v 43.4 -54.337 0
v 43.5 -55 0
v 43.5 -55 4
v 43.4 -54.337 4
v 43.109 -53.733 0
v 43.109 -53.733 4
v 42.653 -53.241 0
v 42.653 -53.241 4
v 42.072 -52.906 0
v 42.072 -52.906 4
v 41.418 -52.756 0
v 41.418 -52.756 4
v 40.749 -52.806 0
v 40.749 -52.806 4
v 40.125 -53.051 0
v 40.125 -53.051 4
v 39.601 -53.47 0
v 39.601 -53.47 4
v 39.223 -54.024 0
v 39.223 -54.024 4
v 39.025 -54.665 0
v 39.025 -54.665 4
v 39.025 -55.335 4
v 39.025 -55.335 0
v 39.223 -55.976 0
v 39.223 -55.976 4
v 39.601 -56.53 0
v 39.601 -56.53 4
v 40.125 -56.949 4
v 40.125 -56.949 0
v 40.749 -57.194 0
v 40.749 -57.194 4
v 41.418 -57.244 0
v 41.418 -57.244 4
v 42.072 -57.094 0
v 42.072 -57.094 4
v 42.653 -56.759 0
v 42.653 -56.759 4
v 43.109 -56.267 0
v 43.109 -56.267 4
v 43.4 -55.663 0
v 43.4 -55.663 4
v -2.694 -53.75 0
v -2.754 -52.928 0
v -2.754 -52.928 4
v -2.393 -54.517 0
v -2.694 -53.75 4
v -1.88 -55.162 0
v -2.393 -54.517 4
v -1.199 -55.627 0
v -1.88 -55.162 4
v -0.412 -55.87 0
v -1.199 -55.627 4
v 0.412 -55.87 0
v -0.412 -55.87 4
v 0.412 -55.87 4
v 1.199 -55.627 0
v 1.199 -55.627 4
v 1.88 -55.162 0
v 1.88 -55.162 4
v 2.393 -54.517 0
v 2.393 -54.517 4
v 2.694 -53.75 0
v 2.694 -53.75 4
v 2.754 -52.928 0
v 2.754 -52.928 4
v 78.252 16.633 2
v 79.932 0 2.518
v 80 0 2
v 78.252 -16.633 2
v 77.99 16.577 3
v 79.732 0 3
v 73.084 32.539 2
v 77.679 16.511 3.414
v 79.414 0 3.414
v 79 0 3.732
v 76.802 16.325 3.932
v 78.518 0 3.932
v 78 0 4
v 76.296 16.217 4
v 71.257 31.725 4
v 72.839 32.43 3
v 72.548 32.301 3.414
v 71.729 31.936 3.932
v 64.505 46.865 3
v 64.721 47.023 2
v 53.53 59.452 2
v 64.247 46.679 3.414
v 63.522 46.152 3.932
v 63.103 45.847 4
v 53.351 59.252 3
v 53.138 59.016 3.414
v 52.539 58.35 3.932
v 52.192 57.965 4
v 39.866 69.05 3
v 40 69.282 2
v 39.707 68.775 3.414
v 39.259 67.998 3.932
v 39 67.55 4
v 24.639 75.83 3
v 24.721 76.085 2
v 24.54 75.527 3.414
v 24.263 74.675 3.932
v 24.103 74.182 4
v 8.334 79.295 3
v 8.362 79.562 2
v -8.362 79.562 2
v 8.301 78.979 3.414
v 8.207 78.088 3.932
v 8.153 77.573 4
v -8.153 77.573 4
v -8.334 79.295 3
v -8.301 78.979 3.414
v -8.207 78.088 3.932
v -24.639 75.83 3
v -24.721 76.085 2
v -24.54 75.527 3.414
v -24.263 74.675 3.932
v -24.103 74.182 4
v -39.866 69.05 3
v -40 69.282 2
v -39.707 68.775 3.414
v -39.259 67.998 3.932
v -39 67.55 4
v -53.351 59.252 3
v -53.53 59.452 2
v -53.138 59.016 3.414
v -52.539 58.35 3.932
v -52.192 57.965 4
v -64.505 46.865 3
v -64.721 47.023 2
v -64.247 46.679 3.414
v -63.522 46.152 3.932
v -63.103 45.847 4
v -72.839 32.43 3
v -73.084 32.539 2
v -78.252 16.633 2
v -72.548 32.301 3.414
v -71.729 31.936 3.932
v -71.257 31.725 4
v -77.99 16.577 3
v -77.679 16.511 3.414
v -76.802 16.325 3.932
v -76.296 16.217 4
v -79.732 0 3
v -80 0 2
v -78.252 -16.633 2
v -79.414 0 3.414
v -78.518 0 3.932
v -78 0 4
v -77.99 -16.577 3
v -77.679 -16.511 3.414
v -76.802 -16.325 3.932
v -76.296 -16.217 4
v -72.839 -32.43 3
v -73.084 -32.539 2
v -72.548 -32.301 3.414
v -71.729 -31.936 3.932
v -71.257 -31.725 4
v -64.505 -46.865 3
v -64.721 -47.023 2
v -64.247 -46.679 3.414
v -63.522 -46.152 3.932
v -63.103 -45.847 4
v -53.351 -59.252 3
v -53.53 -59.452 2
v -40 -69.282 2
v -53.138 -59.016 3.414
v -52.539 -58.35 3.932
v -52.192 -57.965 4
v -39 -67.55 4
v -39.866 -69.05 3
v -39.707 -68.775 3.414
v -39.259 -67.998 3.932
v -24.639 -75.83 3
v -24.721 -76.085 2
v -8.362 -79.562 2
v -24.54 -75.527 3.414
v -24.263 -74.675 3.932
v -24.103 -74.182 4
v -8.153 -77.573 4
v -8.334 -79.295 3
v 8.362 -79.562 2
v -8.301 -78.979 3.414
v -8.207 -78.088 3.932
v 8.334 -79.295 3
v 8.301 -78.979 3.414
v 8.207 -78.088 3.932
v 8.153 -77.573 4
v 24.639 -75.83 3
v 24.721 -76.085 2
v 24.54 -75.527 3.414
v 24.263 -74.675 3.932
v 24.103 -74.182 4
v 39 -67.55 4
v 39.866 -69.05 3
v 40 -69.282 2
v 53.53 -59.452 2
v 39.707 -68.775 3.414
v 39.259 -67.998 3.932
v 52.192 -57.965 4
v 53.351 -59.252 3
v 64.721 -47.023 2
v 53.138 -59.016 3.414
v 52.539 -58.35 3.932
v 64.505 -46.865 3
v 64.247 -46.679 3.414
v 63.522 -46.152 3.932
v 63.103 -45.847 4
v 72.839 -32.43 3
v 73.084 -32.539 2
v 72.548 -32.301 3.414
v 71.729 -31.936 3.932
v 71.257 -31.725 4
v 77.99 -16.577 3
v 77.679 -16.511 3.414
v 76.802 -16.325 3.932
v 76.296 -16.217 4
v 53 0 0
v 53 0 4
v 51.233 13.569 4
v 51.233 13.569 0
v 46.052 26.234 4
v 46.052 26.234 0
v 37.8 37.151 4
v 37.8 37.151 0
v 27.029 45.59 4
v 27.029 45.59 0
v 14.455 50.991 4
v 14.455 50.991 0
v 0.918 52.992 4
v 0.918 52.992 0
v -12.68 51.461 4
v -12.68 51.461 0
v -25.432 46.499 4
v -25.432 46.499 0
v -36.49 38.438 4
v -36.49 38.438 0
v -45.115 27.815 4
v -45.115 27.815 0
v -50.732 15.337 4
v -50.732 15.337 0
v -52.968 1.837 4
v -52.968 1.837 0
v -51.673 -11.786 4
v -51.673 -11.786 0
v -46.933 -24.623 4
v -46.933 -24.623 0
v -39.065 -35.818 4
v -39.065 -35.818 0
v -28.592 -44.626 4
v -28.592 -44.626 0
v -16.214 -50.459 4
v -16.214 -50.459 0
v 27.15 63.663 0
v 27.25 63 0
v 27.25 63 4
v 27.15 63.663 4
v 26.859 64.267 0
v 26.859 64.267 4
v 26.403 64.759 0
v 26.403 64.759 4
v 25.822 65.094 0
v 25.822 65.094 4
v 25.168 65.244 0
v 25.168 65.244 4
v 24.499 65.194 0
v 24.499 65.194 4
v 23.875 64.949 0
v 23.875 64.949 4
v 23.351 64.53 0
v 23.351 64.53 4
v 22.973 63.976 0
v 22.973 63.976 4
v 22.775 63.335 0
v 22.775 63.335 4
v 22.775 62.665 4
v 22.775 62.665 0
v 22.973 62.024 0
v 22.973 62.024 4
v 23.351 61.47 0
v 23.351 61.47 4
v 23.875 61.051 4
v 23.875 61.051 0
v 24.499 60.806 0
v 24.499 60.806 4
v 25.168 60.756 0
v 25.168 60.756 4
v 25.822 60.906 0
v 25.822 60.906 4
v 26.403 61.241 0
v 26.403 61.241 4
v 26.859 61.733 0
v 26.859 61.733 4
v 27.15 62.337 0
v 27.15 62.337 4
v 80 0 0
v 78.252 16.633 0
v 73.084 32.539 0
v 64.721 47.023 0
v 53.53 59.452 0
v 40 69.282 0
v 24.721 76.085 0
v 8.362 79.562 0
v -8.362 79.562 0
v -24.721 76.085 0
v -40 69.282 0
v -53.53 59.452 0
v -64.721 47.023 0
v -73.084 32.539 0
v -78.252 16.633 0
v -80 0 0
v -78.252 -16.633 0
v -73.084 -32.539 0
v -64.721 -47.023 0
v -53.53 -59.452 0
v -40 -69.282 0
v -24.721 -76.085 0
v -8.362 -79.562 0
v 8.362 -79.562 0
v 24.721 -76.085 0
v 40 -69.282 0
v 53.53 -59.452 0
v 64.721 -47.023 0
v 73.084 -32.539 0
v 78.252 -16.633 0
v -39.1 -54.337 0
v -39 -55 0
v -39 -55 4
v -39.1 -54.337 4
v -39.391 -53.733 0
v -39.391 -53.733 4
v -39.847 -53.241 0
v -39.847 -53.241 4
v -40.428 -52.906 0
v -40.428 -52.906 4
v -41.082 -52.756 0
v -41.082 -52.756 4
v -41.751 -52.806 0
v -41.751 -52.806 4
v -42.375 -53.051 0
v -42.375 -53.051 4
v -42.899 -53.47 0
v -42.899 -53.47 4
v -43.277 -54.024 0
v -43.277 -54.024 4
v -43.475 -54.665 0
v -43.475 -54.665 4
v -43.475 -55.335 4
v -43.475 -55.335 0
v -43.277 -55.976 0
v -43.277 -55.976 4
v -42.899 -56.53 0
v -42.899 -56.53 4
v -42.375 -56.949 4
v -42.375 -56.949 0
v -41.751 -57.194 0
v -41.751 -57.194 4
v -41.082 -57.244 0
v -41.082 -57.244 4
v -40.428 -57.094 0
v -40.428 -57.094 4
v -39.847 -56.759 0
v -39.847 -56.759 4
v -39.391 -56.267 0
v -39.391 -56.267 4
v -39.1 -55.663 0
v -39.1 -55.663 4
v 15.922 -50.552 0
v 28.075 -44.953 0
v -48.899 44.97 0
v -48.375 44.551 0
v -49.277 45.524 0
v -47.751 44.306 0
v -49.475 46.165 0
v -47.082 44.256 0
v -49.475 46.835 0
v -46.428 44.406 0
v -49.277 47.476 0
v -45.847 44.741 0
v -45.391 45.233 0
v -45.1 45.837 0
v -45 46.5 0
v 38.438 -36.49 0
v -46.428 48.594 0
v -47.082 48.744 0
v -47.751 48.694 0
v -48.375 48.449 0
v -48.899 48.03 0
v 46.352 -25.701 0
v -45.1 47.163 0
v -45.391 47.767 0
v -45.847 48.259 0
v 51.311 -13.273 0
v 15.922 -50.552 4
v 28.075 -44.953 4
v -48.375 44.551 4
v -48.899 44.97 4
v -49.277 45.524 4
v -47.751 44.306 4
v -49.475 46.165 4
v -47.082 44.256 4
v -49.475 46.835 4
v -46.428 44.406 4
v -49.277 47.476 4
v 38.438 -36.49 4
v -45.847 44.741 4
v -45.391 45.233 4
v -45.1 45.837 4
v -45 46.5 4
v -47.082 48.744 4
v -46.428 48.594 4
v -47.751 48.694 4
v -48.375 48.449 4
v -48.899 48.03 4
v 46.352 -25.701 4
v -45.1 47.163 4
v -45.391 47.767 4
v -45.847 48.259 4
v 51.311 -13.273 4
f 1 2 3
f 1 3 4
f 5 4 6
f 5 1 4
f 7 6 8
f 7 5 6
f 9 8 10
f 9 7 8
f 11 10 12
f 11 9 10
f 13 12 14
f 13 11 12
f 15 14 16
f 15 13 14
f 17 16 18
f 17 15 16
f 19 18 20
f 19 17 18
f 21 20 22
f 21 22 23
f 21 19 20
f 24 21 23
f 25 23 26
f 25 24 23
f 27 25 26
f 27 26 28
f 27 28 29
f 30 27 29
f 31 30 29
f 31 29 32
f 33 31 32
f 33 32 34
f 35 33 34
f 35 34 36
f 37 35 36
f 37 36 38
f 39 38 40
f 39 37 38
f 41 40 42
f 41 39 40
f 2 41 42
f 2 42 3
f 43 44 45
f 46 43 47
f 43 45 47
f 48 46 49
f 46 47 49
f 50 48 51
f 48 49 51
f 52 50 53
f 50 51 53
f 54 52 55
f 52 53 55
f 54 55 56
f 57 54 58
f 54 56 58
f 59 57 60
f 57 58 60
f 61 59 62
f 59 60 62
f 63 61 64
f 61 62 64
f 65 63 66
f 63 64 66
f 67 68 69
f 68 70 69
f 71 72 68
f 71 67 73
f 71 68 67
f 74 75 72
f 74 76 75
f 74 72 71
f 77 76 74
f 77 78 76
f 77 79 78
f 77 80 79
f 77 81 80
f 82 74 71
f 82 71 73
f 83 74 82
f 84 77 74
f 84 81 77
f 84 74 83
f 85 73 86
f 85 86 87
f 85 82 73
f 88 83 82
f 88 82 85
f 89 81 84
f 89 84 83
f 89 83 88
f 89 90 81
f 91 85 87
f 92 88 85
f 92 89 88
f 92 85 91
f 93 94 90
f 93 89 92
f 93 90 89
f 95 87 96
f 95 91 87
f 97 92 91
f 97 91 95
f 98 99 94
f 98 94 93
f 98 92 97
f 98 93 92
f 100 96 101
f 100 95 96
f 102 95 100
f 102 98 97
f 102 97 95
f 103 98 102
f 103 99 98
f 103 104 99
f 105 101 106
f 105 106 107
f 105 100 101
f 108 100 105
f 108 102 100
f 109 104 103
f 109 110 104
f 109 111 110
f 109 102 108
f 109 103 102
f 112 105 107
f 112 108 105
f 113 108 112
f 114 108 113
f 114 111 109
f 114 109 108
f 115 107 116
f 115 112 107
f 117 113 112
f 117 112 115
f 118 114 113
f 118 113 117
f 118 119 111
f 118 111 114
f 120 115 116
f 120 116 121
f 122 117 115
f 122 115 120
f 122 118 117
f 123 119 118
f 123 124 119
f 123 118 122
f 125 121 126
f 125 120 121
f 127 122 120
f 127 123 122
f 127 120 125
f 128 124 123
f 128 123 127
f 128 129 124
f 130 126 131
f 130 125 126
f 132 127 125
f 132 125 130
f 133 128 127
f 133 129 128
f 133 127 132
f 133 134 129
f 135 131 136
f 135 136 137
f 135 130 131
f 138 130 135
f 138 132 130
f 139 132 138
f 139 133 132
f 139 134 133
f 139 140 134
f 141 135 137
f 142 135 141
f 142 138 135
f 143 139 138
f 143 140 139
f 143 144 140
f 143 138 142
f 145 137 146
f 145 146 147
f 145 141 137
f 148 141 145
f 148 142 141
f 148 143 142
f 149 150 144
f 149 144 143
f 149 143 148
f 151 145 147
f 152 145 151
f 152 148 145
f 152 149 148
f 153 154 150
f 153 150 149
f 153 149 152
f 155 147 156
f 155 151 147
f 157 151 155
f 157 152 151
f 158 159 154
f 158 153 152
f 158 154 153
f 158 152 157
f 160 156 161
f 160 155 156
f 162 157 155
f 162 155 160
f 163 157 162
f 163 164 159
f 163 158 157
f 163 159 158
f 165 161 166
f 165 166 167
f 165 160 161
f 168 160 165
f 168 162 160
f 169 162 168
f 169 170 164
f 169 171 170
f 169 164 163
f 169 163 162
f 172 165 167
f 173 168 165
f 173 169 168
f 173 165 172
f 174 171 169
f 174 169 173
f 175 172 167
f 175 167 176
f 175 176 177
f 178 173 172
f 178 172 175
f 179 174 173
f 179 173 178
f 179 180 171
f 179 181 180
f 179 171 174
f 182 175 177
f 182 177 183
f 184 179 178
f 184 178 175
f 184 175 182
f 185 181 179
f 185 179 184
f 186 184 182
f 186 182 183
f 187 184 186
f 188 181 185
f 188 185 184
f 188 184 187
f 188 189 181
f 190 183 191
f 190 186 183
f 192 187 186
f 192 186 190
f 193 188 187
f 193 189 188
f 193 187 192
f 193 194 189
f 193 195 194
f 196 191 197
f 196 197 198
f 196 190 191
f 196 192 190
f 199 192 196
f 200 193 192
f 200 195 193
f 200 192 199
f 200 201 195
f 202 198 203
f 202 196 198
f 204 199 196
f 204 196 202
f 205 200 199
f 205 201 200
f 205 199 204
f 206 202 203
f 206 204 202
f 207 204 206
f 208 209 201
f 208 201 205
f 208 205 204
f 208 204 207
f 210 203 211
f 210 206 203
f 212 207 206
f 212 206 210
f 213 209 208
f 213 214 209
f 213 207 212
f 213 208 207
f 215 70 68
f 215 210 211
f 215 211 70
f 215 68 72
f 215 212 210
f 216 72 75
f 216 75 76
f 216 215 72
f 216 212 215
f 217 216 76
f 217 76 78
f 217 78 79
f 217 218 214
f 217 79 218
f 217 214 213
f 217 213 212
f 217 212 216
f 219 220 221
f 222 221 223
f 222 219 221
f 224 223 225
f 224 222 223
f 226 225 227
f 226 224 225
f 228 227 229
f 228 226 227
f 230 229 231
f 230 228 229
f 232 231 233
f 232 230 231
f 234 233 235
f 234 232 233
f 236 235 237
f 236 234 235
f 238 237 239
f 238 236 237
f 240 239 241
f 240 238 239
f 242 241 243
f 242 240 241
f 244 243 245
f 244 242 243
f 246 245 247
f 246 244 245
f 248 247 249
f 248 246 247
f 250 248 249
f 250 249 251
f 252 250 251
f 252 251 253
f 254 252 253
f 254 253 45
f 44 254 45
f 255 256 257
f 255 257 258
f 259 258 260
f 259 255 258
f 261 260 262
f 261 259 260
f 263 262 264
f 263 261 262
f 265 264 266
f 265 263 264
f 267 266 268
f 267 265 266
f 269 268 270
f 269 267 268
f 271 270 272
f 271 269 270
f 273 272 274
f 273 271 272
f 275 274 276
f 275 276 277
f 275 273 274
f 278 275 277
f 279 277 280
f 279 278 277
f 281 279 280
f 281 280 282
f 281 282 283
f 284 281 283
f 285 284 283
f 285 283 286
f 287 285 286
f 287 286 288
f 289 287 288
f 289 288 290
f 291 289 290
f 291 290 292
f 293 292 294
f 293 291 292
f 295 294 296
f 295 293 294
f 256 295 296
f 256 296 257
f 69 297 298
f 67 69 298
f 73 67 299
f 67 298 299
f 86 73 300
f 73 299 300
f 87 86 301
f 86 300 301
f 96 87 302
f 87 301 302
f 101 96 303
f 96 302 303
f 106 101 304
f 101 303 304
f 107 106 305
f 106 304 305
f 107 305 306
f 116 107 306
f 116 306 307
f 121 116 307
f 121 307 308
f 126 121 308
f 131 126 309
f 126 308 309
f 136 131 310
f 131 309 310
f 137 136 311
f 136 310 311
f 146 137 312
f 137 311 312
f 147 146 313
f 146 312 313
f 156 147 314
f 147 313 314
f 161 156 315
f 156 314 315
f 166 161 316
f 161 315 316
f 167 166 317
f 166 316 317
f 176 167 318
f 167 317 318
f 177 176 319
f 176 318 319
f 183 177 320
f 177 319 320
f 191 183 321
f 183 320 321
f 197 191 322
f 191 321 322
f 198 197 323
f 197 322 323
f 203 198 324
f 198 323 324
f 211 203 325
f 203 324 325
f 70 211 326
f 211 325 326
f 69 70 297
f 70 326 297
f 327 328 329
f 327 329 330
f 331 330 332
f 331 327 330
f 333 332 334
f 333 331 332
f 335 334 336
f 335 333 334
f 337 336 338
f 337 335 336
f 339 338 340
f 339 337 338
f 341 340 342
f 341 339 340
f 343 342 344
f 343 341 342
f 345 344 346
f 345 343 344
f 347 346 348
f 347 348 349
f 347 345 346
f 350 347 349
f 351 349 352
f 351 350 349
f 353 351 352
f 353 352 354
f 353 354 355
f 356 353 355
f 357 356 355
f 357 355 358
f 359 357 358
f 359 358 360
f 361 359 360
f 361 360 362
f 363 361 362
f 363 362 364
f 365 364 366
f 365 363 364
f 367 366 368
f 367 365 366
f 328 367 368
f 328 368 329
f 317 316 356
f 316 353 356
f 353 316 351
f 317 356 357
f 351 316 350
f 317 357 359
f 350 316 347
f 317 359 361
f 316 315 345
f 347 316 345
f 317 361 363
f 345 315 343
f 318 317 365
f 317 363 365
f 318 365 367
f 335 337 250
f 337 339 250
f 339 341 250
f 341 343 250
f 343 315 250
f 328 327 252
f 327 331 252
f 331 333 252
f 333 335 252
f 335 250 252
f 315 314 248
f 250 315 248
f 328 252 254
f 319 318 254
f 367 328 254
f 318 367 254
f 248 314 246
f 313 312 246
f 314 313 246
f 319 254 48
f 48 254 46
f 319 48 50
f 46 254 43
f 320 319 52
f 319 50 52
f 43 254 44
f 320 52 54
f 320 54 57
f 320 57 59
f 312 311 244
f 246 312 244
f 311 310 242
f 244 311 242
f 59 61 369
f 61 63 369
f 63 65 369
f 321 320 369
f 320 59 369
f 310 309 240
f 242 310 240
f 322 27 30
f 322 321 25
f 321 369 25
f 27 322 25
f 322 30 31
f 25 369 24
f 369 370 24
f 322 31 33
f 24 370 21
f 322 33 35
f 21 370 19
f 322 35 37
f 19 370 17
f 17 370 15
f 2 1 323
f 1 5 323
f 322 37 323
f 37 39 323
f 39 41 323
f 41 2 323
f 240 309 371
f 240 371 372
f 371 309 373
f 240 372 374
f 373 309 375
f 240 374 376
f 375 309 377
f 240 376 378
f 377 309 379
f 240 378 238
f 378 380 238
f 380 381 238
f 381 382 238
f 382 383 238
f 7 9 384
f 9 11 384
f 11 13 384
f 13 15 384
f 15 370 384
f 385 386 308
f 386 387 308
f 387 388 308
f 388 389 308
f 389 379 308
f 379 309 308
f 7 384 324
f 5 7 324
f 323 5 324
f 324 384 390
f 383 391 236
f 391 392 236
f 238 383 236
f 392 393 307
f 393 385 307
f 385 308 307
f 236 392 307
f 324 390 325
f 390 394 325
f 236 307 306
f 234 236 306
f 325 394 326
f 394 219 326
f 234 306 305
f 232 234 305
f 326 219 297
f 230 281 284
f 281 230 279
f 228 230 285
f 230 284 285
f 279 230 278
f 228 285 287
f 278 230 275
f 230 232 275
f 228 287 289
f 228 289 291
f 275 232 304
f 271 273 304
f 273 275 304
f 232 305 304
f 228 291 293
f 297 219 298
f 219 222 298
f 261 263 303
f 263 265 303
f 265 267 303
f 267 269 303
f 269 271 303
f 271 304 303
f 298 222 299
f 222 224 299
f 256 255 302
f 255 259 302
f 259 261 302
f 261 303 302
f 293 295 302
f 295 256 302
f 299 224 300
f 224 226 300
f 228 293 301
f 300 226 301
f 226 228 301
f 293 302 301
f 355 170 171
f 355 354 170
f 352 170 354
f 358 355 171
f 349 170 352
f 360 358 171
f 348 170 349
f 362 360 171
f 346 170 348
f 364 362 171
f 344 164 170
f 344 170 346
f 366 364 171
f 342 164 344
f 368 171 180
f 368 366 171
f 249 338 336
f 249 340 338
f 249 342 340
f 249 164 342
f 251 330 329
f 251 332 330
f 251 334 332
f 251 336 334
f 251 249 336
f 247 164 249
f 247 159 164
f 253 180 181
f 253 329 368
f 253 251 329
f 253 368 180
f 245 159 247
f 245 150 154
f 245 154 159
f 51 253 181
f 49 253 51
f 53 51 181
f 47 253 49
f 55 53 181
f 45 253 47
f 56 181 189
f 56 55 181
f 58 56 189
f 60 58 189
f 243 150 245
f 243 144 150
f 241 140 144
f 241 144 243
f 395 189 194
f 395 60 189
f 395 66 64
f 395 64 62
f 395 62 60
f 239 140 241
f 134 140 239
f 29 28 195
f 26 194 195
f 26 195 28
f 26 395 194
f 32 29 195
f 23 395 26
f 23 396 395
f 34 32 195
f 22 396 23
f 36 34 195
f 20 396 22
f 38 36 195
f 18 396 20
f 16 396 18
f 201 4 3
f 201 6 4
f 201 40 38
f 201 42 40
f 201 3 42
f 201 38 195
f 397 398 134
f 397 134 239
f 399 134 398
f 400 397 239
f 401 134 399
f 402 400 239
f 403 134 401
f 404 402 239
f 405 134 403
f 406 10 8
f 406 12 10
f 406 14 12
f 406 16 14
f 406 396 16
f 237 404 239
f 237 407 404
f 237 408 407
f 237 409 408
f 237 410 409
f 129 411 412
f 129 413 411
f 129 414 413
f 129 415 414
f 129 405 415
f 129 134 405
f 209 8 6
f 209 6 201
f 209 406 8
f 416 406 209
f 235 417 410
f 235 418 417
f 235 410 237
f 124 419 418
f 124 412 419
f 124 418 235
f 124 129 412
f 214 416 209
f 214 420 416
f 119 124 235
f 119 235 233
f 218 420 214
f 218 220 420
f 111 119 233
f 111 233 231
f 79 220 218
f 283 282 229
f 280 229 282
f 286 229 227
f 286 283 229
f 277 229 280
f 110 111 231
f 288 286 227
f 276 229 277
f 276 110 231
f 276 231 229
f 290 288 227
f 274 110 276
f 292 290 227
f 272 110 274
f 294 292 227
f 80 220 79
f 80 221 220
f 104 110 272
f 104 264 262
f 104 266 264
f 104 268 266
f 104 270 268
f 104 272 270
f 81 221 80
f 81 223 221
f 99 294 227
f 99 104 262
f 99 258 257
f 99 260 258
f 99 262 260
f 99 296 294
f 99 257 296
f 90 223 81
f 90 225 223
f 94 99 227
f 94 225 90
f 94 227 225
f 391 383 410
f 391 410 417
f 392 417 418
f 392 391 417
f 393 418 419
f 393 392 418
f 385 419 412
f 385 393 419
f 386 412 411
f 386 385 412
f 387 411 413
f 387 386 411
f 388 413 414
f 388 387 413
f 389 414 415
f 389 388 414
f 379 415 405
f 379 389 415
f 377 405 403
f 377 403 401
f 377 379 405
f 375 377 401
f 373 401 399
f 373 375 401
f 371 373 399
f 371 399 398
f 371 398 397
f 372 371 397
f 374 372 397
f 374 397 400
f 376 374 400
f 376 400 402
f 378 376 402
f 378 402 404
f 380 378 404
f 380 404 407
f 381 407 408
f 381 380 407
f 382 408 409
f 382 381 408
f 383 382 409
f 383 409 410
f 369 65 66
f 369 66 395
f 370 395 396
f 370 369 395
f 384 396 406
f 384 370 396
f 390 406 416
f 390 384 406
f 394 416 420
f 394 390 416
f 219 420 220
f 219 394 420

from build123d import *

# Parameters (mm, degrees)
SKETCH_R     = 80
SKETCH_R_2   = 53
SKETCH_R_3   = 2.25
PAD_DEPTH    = 4
SKETCH001_R  = 2.762237
POCKET_DEPTH = 4.001
FILLET_R     = 2


with BuildPart() as part:
    # Sketch → Pad (new body)
    with BuildSketch(Plane.XY):
        Circle(SKETCH_R)
        Circle(SKETCH_R_2, mode=Mode.SUBTRACT)
        with Locations((25, 63)):
            Circle(SKETCH_R_3, mode=Mode.SUBTRACT)
        with Locations((-47.25, 46.5)):
            Circle(SKETCH_R_3, mode=Mode.SUBTRACT)
        with Locations((-41.25, -55)):
            Circle(SKETCH_R_3, mode=Mode.SUBTRACT)
        with Locations((41.25, -55)):
            Circle(SKETCH_R_3, mode=Mode.SUBTRACT)
    extrude(amount=PAD_DEPTH)

    # Sketch001 (on Face8 of Pad) → Pocket (cut, through all)
    with BuildSketch(Plane.XY.offset(4)):
        with Locations((0, -53.138237)):
            Circle(SKETCH001_R)
    extrude(amount=-POCKET_DEPTH, mode=Mode.SUBTRACT)

    # Fillet
    fillet_edges = [part.edges().sort_by_distance(p)[0] for p in [
        (-80, 0, 4),
    ]]
    fillet(fillet_edges, radius=FILLET_R)


solid = part.part
